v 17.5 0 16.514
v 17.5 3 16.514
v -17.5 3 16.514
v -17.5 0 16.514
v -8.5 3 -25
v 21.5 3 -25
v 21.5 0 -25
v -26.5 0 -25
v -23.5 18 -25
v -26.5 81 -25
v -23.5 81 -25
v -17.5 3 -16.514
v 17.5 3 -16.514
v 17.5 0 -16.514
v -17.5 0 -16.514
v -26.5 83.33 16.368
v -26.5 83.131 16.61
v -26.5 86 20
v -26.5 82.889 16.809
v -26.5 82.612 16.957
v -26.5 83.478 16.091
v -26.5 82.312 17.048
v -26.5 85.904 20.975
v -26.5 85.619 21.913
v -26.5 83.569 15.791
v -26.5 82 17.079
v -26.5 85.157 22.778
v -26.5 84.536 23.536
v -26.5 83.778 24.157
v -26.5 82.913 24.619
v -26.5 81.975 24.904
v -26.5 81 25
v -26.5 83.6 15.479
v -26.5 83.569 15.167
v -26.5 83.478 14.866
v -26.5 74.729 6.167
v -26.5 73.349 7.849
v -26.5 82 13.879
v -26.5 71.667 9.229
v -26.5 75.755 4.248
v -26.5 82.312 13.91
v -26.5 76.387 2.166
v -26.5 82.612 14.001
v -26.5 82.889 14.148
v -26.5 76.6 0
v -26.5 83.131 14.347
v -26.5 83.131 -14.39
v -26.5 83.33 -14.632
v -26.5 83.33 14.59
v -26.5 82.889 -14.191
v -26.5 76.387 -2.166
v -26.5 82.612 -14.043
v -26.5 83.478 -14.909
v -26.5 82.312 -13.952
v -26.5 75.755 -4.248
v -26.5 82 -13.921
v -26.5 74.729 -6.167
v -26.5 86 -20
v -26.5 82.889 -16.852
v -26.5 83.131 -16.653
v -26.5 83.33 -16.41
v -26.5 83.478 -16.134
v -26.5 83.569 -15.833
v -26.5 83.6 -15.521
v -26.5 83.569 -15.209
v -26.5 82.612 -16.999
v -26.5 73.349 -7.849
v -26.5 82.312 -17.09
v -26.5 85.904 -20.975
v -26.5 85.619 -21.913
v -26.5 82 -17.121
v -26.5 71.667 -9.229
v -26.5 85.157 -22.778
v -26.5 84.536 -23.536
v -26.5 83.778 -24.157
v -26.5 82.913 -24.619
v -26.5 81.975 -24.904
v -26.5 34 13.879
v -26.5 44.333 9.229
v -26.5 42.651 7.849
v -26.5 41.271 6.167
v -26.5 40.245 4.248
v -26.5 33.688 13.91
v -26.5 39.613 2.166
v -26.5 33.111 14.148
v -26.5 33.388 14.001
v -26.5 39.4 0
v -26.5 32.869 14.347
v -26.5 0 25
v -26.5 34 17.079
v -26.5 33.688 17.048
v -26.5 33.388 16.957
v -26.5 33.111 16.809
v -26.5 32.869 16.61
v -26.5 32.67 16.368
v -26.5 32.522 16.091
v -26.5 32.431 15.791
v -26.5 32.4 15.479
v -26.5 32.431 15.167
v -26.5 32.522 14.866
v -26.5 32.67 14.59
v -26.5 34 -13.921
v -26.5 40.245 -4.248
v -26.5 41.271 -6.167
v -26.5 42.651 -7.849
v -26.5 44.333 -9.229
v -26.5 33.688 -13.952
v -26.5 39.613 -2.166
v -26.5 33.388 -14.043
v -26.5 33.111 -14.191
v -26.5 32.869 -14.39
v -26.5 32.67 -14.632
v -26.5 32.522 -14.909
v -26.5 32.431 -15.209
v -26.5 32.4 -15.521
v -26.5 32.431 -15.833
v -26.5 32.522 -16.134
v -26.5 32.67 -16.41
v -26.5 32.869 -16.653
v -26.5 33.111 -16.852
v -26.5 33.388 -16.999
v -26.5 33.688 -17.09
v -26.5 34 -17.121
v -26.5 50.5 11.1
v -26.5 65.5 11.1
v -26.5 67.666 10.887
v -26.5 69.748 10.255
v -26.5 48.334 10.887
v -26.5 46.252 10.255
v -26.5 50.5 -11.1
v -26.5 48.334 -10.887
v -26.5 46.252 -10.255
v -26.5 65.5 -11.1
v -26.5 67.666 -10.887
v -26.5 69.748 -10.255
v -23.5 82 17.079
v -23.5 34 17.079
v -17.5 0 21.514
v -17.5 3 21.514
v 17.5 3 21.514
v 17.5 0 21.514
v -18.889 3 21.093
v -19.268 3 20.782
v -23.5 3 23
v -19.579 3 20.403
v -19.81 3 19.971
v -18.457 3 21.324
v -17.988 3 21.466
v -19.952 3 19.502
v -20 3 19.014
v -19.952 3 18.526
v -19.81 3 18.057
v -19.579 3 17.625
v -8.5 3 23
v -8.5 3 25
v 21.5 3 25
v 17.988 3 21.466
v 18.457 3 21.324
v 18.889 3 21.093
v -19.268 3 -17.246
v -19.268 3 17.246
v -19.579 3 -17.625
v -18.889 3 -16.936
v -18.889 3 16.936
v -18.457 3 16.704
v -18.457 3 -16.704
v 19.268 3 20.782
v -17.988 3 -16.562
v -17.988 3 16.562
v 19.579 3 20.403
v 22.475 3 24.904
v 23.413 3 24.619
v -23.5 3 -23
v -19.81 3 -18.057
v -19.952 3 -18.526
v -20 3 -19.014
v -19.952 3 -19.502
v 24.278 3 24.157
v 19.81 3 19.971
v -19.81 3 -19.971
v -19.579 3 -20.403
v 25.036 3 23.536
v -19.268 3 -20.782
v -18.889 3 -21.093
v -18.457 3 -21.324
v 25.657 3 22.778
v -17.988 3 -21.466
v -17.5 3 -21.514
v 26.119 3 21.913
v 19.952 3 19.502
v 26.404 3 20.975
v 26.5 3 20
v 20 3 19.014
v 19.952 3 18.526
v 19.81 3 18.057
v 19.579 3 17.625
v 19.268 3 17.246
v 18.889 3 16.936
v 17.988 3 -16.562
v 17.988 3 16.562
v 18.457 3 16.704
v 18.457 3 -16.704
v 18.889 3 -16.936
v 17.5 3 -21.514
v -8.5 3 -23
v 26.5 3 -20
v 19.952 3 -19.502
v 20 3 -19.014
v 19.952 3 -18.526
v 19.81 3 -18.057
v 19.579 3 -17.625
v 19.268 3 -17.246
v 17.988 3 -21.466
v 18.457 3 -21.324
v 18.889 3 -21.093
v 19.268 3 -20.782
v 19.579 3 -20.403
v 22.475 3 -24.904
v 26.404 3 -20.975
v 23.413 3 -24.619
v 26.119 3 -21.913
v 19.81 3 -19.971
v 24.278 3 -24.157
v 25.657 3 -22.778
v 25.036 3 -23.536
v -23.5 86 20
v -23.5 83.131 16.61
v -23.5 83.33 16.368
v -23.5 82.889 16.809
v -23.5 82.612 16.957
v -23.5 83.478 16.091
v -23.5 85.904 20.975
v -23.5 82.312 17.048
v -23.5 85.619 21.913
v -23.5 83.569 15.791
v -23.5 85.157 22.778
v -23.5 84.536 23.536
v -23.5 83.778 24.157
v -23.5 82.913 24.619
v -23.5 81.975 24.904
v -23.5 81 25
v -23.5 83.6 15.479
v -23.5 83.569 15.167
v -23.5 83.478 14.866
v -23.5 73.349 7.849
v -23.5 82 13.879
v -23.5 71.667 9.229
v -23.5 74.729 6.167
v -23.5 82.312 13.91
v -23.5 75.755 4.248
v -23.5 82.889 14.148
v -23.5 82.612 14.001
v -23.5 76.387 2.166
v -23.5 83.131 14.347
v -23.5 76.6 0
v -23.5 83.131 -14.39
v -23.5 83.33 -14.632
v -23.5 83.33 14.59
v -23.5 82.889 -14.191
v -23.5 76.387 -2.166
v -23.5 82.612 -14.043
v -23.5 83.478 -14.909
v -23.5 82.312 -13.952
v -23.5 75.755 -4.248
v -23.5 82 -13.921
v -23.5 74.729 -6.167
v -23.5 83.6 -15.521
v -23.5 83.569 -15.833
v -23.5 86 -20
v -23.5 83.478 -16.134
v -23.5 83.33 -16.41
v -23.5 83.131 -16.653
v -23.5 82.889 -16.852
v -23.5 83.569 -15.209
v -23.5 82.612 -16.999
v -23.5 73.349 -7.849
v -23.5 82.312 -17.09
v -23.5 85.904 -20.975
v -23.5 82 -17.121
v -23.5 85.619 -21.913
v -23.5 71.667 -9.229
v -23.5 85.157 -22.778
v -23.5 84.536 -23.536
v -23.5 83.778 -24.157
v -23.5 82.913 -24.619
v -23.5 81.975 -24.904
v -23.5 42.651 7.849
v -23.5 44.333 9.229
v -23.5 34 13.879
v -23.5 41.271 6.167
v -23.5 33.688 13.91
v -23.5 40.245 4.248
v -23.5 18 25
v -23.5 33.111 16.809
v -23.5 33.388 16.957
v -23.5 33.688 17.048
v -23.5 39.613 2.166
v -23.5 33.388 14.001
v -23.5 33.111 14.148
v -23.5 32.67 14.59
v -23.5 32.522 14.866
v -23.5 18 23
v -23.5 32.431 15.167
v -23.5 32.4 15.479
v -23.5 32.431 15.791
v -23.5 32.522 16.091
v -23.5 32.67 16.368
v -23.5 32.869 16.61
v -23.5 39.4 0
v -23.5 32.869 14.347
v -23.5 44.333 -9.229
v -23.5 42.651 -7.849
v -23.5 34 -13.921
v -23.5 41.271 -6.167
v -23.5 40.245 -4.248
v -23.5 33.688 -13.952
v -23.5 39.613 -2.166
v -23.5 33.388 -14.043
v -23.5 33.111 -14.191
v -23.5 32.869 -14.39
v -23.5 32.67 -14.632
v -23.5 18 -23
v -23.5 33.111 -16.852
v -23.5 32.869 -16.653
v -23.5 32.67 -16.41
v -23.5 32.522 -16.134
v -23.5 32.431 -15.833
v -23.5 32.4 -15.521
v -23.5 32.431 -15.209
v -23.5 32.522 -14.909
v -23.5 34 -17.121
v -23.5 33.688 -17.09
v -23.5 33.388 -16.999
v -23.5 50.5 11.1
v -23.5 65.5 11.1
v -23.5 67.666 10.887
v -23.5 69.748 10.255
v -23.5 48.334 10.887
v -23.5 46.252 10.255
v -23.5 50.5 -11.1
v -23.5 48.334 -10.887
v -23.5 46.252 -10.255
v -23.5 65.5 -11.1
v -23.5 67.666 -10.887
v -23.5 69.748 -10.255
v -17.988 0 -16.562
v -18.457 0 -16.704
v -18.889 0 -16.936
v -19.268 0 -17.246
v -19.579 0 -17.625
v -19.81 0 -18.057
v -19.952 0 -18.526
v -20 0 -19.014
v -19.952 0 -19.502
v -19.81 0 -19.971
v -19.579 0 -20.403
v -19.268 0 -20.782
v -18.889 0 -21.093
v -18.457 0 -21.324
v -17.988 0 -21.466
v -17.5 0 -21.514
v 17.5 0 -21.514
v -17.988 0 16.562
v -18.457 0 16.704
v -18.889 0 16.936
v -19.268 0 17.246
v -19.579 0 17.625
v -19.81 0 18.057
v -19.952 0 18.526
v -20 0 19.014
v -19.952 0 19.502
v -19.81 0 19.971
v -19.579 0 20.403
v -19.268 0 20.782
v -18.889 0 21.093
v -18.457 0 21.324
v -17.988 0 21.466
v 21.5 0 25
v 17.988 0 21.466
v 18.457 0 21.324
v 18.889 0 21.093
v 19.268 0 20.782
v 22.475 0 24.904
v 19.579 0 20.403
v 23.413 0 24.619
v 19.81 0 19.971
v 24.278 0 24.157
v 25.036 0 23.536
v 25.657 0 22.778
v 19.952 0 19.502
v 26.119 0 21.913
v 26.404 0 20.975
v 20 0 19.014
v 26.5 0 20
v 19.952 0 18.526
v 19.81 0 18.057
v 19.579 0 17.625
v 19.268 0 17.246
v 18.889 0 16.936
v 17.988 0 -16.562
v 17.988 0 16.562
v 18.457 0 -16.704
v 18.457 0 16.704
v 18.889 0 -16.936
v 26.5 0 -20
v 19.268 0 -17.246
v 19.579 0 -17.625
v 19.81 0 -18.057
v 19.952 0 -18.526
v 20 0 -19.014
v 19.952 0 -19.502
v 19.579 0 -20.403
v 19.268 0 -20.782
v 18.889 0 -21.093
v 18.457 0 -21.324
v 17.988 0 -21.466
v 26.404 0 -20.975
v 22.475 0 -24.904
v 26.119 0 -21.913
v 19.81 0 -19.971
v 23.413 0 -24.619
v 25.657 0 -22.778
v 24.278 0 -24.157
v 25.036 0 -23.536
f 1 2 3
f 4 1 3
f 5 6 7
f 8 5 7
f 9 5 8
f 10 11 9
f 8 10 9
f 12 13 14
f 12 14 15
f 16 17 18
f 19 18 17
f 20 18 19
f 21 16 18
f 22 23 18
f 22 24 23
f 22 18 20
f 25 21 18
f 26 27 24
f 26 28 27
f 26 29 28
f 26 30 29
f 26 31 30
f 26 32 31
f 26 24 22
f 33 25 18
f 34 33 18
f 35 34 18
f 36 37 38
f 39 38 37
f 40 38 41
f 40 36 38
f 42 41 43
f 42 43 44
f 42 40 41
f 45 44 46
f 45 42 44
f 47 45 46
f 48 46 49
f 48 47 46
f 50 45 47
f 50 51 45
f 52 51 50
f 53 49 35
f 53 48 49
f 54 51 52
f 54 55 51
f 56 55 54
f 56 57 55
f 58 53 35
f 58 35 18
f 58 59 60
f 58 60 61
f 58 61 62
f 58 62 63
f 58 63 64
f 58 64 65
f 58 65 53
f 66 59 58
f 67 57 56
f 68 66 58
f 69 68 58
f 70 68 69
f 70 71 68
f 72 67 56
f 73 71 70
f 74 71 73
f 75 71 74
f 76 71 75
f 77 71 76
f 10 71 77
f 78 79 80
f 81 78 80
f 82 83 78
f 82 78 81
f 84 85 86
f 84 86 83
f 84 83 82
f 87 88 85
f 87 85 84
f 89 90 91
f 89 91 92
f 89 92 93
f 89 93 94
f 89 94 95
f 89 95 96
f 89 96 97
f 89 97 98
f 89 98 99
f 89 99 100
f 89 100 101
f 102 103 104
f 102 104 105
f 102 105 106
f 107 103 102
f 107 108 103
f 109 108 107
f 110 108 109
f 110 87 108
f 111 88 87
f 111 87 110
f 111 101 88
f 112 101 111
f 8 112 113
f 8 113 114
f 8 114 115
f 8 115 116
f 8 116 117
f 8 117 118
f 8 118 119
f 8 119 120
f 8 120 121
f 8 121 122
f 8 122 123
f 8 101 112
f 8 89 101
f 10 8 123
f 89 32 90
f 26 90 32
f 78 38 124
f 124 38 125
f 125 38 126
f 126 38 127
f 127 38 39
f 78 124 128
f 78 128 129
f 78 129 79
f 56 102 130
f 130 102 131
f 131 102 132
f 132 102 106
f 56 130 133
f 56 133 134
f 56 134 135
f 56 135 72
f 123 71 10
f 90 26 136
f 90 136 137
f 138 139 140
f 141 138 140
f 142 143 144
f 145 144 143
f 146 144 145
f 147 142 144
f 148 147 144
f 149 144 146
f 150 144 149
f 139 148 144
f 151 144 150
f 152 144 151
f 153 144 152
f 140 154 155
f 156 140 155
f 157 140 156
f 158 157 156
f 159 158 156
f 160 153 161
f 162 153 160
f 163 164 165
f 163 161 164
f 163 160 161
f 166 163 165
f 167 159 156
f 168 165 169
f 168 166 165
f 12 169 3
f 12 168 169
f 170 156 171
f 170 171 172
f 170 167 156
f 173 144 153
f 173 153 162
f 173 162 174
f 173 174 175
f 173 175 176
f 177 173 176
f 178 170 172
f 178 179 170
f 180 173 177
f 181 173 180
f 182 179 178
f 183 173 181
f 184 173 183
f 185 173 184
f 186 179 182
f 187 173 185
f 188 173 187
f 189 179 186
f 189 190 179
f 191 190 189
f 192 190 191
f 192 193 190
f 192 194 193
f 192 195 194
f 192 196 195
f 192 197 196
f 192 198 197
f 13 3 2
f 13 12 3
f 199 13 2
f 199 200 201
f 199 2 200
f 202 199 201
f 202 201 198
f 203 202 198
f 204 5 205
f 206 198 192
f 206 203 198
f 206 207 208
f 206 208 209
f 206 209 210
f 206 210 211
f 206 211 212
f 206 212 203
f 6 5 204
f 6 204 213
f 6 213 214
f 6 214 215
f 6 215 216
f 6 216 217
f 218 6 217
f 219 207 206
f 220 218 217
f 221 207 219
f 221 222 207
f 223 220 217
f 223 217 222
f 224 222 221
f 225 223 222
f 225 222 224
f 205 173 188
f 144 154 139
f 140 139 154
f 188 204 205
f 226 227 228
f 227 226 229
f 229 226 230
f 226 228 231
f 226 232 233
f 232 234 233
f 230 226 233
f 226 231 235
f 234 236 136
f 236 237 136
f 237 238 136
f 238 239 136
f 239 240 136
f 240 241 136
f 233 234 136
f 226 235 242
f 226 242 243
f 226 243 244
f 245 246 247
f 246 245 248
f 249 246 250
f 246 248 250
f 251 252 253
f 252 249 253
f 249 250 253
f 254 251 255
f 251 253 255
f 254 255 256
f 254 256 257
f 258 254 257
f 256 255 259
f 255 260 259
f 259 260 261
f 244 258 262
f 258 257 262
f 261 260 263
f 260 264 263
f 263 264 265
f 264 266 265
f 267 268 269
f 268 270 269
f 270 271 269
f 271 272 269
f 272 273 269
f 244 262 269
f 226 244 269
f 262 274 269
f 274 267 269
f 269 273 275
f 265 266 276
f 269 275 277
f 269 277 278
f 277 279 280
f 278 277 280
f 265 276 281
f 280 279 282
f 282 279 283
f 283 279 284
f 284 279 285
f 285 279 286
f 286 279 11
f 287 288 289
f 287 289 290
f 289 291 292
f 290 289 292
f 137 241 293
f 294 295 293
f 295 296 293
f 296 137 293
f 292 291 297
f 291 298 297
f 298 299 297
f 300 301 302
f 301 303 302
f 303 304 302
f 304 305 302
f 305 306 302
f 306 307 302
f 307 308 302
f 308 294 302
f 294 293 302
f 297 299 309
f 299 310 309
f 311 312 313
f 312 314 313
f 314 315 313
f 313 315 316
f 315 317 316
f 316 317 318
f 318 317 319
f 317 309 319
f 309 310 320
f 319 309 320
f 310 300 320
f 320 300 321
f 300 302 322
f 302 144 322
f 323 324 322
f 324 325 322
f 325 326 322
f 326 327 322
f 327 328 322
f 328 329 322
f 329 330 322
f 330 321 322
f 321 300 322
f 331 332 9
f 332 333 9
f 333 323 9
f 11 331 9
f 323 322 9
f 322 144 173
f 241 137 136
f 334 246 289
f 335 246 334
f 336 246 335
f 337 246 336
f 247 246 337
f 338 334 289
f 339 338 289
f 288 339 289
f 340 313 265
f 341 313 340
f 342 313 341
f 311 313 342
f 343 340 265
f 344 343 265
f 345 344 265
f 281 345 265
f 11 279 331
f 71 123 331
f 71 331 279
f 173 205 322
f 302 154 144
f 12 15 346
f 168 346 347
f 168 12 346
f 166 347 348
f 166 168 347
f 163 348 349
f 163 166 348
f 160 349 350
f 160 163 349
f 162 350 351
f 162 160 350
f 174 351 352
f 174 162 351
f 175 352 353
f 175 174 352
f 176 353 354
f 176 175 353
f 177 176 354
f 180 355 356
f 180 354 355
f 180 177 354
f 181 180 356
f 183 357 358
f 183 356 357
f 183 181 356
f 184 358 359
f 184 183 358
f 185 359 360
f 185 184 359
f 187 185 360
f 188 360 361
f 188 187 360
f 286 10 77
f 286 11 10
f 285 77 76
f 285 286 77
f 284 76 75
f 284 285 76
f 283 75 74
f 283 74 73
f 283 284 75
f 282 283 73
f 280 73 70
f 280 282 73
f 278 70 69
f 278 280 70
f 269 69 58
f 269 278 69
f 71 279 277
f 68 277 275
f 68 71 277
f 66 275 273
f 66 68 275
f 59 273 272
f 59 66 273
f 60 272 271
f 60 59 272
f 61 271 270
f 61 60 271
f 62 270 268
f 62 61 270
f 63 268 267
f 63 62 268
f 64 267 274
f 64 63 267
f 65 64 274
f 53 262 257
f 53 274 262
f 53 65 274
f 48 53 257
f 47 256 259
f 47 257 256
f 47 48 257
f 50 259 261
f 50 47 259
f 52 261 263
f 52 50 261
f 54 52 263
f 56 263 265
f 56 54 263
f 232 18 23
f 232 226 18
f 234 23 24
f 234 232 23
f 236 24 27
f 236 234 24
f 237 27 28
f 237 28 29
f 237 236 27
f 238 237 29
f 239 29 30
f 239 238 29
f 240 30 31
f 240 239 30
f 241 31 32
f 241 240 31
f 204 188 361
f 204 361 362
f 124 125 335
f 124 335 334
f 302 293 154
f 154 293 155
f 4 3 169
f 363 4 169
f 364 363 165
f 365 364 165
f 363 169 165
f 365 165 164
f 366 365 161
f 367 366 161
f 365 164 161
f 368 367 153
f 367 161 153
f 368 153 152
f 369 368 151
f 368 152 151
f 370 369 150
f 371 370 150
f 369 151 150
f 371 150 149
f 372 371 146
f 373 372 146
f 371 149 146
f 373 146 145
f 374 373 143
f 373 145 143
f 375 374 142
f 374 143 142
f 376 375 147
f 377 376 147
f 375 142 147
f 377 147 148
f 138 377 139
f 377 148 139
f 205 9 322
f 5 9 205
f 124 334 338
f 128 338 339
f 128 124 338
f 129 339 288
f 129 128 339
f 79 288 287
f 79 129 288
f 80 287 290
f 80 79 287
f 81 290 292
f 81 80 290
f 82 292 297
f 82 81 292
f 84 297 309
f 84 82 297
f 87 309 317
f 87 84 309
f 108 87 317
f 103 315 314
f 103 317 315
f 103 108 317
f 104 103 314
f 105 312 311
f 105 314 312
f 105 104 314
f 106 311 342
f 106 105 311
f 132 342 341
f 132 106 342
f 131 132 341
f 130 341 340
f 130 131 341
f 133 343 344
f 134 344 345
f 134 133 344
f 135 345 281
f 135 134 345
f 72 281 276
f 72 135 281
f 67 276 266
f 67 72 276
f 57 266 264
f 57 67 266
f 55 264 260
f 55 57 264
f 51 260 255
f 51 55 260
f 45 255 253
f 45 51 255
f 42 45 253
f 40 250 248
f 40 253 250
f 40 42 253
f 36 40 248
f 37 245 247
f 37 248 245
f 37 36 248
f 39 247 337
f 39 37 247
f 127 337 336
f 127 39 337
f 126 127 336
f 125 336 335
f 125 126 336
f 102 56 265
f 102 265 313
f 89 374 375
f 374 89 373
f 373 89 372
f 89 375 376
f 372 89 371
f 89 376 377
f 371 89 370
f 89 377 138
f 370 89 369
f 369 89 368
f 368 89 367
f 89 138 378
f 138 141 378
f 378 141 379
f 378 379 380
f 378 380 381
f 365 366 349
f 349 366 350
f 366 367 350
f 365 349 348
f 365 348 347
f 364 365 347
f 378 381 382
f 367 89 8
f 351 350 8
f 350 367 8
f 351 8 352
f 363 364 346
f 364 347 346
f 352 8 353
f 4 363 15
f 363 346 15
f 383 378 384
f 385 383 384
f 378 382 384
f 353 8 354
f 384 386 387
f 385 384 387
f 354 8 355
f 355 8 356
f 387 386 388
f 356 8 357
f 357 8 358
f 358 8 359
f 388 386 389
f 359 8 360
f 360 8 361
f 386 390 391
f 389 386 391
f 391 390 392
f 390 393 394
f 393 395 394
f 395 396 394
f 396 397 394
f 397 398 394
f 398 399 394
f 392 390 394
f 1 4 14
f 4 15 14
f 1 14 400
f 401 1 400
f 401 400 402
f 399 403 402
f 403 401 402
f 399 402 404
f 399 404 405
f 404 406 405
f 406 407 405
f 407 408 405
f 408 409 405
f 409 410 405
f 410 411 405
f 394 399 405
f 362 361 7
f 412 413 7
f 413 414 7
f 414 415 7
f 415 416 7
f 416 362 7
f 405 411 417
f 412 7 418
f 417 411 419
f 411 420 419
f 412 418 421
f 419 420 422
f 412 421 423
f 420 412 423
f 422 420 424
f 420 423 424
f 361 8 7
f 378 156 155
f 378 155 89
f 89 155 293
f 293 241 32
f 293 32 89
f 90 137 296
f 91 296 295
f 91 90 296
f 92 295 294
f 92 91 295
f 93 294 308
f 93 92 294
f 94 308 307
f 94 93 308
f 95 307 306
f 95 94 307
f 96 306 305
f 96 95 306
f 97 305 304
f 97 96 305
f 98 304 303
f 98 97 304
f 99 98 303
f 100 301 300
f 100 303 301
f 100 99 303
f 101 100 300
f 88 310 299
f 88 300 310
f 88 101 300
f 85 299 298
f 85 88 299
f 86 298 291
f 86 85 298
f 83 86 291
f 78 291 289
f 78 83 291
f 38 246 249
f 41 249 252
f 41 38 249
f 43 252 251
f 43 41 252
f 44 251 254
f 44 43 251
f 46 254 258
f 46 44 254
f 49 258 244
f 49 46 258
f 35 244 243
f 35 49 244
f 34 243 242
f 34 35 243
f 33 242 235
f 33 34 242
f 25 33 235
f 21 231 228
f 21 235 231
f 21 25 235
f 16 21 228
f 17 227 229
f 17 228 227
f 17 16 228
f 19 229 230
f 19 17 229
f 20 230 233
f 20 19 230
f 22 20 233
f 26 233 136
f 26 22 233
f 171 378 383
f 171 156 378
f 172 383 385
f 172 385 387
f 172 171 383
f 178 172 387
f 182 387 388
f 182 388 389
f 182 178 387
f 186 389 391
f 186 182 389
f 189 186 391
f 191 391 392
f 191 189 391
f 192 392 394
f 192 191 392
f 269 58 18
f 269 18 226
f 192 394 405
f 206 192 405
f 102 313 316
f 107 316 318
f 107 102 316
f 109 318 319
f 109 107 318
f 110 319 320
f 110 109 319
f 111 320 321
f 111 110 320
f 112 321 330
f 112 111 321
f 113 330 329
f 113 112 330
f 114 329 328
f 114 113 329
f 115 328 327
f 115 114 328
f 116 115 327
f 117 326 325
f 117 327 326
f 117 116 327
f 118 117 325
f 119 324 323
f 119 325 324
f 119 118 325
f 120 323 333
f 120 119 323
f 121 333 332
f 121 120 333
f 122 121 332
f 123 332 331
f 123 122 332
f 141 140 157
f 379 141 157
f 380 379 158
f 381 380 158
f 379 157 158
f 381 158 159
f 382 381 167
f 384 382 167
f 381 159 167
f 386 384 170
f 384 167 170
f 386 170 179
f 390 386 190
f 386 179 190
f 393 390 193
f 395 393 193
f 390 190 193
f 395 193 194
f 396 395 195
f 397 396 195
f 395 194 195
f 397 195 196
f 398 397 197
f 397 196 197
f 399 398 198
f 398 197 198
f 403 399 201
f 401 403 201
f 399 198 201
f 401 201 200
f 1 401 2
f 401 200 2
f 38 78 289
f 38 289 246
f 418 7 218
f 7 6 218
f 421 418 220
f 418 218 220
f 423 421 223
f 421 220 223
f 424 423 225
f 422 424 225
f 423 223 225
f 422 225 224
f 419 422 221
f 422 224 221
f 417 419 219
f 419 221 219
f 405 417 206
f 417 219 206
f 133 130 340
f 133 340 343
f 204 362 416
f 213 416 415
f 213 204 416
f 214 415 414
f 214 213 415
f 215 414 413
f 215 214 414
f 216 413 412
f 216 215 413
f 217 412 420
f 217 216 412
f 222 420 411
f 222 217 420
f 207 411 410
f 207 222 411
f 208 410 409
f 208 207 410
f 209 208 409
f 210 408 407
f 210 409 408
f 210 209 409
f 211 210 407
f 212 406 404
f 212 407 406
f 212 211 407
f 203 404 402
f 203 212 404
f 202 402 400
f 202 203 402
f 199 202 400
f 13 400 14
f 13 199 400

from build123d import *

# Parameters (mm, degrees)
SKETCH_1_W          = 53
SKETCH_1_H          = 50
EXTRUDE_1_DEPTH     = 3
CUT_EXTRUDE_1_DEPTH = 4
SKETCH_3_W          = 3
SKETCH_3_H          = 50
EXTRUDE_2_DEPTH     = 83
CUT_EXTRUDE_2_DEPTH = 54
EXTRUDE_3_DEPTH     = 2
EXTRUDE_4_DEPTH     = 2
FILLET_1_R          = 5


with BuildPart() as part:
    # 草图1 → 凸台-拉伸1 (new body)
    with BuildSketch(Plane(origin=(0, 0, 0), x_dir=(1, 0, 0), z_dir=(0, 1, 0))):
        Rectangle(SKETCH_1_W, SKETCH_1_H)
    extrude(amount=EXTRUDE_1_DEPTH)

    # 草图2 → 切除-拉伸1 (cut, through all)
    with BuildSketch(Plane(origin=(0, 3, 0), x_dir=(1, 0, 0), z_dir=(0, 1, 0))):
        with BuildLine():
            Line((-17.5, 21.514185104), (17.5, 21.514185104))
            ThreePointArc((17.5, 21.514185104), (20, 19.014185104), (17.5, 16.514185104))
            Line((17.5, 16.514185104), (-17.5, 16.514185104))
            ThreePointArc((-17.5, 16.514185104), (-20, 19.014185104), (-17.5, 21.514185104))
        make_face()
        with BuildLine():
            Line((-17.5, -21.514185104), (17.5, -21.514185104))
            ThreePointArc((17.5, -21.514185104), (20, -19.014185104), (17.5, -16.514185104))
            Line((17.5, -16.514185104), (-17.5, -16.514185104))
            ThreePointArc((-17.5, -16.514185104), (-20, -19.014185104), (-17.5, -21.514185104))
        make_face()
    extrude(amount=-CUT_EXTRUDE_1_DEPTH, mode=Mode.SUBTRACT)

    # 草图3 → 凸台-拉伸2 (add)
    with BuildSketch(Plane(origin=(0, 3, 0), x_dir=(1, 0, 0), z_dir=(0, 1, 0))):
        with Locations((-25, 0)):
            Rectangle(SKETCH_3_W, SKETCH_3_H)
    extrude(amount=EXTRUDE_2_DEPTH)

    # 草图4 → 切除-拉伸2 (cut, through all)
    with BuildSketch(Plane.ZY.offset(26.5)):
        with BuildLine():
            Line((-13.921207139, 82), (-13.921207139, 34))
            ThreePointArc((-13.921207139, 34), (-15.521207139, 32.4), (-17.121207139, 34))
            Line((-17.121207139, 34), (-17.121207139, 82))
            ThreePointArc((-17.121207139, 82), (-15.521207139, 83.6), (-13.921207139, 82))
        make_face()
        with BuildLine():
            Line((11.1, 65.5), (11.1, 50.5))
            ThreePointArc((11.1, 50.5), (0, 39.4), (-11.1, 50.5))
            Line((-11.1, 50.5), (-11.1, 65.5))
            ThreePointArc((-11.1, 65.5), (0, 76.6), (11.1, 65.5))
        make_face()
        with BuildLine():
            Line((17.078792861, 82), (17.078792861, 34))
            ThreePointArc((17.078792861, 34), (15.478792861, 32.4), (13.878792861, 34))
            Line((13.878792861, 34), (13.878792861, 82))
            ThreePointArc((13.878792861, 82), (15.478792861, 83.6), (17.078792861, 82))
        make_face()
    extrude(amount=-CUT_EXTRUDE_2_DEPTH, mode=Mode.SUBTRACT)

    # 草图5 → 凸台-拉伸3 (add)
    with BuildSketch(Plane.XY.offset(25)):
        Polygon((-23.5, 18), (-8.5, 3), (-23.5, 3), align=None)
    extrude(amount=-EXTRUDE_3_DEPTH)

    # 草图7 → 凸台-拉伸4 (add)
    with BuildSketch(Plane(origin=(0, 0, -25), x_dir=(-1, 0, 0), z_dir=(0, 0, -1))):
        Polygon((23.5, 18), (8.5, 3), (23.5, 3), align=None)
    extrude(amount=-EXTRUDE_4_DEPTH)

    # 圆角1
    fillet_1_edges = [part.edges().sort_by_distance(p)[0] for p in [
        (-25, 86, 25),
        (-25, 86, -25),
        (26.5, 1.5, 25),
        (26.5, 1.5, -25),
    ]]
    fillet(fillet_1_edges, radius=FILLET_1_R)


solid = part.part
